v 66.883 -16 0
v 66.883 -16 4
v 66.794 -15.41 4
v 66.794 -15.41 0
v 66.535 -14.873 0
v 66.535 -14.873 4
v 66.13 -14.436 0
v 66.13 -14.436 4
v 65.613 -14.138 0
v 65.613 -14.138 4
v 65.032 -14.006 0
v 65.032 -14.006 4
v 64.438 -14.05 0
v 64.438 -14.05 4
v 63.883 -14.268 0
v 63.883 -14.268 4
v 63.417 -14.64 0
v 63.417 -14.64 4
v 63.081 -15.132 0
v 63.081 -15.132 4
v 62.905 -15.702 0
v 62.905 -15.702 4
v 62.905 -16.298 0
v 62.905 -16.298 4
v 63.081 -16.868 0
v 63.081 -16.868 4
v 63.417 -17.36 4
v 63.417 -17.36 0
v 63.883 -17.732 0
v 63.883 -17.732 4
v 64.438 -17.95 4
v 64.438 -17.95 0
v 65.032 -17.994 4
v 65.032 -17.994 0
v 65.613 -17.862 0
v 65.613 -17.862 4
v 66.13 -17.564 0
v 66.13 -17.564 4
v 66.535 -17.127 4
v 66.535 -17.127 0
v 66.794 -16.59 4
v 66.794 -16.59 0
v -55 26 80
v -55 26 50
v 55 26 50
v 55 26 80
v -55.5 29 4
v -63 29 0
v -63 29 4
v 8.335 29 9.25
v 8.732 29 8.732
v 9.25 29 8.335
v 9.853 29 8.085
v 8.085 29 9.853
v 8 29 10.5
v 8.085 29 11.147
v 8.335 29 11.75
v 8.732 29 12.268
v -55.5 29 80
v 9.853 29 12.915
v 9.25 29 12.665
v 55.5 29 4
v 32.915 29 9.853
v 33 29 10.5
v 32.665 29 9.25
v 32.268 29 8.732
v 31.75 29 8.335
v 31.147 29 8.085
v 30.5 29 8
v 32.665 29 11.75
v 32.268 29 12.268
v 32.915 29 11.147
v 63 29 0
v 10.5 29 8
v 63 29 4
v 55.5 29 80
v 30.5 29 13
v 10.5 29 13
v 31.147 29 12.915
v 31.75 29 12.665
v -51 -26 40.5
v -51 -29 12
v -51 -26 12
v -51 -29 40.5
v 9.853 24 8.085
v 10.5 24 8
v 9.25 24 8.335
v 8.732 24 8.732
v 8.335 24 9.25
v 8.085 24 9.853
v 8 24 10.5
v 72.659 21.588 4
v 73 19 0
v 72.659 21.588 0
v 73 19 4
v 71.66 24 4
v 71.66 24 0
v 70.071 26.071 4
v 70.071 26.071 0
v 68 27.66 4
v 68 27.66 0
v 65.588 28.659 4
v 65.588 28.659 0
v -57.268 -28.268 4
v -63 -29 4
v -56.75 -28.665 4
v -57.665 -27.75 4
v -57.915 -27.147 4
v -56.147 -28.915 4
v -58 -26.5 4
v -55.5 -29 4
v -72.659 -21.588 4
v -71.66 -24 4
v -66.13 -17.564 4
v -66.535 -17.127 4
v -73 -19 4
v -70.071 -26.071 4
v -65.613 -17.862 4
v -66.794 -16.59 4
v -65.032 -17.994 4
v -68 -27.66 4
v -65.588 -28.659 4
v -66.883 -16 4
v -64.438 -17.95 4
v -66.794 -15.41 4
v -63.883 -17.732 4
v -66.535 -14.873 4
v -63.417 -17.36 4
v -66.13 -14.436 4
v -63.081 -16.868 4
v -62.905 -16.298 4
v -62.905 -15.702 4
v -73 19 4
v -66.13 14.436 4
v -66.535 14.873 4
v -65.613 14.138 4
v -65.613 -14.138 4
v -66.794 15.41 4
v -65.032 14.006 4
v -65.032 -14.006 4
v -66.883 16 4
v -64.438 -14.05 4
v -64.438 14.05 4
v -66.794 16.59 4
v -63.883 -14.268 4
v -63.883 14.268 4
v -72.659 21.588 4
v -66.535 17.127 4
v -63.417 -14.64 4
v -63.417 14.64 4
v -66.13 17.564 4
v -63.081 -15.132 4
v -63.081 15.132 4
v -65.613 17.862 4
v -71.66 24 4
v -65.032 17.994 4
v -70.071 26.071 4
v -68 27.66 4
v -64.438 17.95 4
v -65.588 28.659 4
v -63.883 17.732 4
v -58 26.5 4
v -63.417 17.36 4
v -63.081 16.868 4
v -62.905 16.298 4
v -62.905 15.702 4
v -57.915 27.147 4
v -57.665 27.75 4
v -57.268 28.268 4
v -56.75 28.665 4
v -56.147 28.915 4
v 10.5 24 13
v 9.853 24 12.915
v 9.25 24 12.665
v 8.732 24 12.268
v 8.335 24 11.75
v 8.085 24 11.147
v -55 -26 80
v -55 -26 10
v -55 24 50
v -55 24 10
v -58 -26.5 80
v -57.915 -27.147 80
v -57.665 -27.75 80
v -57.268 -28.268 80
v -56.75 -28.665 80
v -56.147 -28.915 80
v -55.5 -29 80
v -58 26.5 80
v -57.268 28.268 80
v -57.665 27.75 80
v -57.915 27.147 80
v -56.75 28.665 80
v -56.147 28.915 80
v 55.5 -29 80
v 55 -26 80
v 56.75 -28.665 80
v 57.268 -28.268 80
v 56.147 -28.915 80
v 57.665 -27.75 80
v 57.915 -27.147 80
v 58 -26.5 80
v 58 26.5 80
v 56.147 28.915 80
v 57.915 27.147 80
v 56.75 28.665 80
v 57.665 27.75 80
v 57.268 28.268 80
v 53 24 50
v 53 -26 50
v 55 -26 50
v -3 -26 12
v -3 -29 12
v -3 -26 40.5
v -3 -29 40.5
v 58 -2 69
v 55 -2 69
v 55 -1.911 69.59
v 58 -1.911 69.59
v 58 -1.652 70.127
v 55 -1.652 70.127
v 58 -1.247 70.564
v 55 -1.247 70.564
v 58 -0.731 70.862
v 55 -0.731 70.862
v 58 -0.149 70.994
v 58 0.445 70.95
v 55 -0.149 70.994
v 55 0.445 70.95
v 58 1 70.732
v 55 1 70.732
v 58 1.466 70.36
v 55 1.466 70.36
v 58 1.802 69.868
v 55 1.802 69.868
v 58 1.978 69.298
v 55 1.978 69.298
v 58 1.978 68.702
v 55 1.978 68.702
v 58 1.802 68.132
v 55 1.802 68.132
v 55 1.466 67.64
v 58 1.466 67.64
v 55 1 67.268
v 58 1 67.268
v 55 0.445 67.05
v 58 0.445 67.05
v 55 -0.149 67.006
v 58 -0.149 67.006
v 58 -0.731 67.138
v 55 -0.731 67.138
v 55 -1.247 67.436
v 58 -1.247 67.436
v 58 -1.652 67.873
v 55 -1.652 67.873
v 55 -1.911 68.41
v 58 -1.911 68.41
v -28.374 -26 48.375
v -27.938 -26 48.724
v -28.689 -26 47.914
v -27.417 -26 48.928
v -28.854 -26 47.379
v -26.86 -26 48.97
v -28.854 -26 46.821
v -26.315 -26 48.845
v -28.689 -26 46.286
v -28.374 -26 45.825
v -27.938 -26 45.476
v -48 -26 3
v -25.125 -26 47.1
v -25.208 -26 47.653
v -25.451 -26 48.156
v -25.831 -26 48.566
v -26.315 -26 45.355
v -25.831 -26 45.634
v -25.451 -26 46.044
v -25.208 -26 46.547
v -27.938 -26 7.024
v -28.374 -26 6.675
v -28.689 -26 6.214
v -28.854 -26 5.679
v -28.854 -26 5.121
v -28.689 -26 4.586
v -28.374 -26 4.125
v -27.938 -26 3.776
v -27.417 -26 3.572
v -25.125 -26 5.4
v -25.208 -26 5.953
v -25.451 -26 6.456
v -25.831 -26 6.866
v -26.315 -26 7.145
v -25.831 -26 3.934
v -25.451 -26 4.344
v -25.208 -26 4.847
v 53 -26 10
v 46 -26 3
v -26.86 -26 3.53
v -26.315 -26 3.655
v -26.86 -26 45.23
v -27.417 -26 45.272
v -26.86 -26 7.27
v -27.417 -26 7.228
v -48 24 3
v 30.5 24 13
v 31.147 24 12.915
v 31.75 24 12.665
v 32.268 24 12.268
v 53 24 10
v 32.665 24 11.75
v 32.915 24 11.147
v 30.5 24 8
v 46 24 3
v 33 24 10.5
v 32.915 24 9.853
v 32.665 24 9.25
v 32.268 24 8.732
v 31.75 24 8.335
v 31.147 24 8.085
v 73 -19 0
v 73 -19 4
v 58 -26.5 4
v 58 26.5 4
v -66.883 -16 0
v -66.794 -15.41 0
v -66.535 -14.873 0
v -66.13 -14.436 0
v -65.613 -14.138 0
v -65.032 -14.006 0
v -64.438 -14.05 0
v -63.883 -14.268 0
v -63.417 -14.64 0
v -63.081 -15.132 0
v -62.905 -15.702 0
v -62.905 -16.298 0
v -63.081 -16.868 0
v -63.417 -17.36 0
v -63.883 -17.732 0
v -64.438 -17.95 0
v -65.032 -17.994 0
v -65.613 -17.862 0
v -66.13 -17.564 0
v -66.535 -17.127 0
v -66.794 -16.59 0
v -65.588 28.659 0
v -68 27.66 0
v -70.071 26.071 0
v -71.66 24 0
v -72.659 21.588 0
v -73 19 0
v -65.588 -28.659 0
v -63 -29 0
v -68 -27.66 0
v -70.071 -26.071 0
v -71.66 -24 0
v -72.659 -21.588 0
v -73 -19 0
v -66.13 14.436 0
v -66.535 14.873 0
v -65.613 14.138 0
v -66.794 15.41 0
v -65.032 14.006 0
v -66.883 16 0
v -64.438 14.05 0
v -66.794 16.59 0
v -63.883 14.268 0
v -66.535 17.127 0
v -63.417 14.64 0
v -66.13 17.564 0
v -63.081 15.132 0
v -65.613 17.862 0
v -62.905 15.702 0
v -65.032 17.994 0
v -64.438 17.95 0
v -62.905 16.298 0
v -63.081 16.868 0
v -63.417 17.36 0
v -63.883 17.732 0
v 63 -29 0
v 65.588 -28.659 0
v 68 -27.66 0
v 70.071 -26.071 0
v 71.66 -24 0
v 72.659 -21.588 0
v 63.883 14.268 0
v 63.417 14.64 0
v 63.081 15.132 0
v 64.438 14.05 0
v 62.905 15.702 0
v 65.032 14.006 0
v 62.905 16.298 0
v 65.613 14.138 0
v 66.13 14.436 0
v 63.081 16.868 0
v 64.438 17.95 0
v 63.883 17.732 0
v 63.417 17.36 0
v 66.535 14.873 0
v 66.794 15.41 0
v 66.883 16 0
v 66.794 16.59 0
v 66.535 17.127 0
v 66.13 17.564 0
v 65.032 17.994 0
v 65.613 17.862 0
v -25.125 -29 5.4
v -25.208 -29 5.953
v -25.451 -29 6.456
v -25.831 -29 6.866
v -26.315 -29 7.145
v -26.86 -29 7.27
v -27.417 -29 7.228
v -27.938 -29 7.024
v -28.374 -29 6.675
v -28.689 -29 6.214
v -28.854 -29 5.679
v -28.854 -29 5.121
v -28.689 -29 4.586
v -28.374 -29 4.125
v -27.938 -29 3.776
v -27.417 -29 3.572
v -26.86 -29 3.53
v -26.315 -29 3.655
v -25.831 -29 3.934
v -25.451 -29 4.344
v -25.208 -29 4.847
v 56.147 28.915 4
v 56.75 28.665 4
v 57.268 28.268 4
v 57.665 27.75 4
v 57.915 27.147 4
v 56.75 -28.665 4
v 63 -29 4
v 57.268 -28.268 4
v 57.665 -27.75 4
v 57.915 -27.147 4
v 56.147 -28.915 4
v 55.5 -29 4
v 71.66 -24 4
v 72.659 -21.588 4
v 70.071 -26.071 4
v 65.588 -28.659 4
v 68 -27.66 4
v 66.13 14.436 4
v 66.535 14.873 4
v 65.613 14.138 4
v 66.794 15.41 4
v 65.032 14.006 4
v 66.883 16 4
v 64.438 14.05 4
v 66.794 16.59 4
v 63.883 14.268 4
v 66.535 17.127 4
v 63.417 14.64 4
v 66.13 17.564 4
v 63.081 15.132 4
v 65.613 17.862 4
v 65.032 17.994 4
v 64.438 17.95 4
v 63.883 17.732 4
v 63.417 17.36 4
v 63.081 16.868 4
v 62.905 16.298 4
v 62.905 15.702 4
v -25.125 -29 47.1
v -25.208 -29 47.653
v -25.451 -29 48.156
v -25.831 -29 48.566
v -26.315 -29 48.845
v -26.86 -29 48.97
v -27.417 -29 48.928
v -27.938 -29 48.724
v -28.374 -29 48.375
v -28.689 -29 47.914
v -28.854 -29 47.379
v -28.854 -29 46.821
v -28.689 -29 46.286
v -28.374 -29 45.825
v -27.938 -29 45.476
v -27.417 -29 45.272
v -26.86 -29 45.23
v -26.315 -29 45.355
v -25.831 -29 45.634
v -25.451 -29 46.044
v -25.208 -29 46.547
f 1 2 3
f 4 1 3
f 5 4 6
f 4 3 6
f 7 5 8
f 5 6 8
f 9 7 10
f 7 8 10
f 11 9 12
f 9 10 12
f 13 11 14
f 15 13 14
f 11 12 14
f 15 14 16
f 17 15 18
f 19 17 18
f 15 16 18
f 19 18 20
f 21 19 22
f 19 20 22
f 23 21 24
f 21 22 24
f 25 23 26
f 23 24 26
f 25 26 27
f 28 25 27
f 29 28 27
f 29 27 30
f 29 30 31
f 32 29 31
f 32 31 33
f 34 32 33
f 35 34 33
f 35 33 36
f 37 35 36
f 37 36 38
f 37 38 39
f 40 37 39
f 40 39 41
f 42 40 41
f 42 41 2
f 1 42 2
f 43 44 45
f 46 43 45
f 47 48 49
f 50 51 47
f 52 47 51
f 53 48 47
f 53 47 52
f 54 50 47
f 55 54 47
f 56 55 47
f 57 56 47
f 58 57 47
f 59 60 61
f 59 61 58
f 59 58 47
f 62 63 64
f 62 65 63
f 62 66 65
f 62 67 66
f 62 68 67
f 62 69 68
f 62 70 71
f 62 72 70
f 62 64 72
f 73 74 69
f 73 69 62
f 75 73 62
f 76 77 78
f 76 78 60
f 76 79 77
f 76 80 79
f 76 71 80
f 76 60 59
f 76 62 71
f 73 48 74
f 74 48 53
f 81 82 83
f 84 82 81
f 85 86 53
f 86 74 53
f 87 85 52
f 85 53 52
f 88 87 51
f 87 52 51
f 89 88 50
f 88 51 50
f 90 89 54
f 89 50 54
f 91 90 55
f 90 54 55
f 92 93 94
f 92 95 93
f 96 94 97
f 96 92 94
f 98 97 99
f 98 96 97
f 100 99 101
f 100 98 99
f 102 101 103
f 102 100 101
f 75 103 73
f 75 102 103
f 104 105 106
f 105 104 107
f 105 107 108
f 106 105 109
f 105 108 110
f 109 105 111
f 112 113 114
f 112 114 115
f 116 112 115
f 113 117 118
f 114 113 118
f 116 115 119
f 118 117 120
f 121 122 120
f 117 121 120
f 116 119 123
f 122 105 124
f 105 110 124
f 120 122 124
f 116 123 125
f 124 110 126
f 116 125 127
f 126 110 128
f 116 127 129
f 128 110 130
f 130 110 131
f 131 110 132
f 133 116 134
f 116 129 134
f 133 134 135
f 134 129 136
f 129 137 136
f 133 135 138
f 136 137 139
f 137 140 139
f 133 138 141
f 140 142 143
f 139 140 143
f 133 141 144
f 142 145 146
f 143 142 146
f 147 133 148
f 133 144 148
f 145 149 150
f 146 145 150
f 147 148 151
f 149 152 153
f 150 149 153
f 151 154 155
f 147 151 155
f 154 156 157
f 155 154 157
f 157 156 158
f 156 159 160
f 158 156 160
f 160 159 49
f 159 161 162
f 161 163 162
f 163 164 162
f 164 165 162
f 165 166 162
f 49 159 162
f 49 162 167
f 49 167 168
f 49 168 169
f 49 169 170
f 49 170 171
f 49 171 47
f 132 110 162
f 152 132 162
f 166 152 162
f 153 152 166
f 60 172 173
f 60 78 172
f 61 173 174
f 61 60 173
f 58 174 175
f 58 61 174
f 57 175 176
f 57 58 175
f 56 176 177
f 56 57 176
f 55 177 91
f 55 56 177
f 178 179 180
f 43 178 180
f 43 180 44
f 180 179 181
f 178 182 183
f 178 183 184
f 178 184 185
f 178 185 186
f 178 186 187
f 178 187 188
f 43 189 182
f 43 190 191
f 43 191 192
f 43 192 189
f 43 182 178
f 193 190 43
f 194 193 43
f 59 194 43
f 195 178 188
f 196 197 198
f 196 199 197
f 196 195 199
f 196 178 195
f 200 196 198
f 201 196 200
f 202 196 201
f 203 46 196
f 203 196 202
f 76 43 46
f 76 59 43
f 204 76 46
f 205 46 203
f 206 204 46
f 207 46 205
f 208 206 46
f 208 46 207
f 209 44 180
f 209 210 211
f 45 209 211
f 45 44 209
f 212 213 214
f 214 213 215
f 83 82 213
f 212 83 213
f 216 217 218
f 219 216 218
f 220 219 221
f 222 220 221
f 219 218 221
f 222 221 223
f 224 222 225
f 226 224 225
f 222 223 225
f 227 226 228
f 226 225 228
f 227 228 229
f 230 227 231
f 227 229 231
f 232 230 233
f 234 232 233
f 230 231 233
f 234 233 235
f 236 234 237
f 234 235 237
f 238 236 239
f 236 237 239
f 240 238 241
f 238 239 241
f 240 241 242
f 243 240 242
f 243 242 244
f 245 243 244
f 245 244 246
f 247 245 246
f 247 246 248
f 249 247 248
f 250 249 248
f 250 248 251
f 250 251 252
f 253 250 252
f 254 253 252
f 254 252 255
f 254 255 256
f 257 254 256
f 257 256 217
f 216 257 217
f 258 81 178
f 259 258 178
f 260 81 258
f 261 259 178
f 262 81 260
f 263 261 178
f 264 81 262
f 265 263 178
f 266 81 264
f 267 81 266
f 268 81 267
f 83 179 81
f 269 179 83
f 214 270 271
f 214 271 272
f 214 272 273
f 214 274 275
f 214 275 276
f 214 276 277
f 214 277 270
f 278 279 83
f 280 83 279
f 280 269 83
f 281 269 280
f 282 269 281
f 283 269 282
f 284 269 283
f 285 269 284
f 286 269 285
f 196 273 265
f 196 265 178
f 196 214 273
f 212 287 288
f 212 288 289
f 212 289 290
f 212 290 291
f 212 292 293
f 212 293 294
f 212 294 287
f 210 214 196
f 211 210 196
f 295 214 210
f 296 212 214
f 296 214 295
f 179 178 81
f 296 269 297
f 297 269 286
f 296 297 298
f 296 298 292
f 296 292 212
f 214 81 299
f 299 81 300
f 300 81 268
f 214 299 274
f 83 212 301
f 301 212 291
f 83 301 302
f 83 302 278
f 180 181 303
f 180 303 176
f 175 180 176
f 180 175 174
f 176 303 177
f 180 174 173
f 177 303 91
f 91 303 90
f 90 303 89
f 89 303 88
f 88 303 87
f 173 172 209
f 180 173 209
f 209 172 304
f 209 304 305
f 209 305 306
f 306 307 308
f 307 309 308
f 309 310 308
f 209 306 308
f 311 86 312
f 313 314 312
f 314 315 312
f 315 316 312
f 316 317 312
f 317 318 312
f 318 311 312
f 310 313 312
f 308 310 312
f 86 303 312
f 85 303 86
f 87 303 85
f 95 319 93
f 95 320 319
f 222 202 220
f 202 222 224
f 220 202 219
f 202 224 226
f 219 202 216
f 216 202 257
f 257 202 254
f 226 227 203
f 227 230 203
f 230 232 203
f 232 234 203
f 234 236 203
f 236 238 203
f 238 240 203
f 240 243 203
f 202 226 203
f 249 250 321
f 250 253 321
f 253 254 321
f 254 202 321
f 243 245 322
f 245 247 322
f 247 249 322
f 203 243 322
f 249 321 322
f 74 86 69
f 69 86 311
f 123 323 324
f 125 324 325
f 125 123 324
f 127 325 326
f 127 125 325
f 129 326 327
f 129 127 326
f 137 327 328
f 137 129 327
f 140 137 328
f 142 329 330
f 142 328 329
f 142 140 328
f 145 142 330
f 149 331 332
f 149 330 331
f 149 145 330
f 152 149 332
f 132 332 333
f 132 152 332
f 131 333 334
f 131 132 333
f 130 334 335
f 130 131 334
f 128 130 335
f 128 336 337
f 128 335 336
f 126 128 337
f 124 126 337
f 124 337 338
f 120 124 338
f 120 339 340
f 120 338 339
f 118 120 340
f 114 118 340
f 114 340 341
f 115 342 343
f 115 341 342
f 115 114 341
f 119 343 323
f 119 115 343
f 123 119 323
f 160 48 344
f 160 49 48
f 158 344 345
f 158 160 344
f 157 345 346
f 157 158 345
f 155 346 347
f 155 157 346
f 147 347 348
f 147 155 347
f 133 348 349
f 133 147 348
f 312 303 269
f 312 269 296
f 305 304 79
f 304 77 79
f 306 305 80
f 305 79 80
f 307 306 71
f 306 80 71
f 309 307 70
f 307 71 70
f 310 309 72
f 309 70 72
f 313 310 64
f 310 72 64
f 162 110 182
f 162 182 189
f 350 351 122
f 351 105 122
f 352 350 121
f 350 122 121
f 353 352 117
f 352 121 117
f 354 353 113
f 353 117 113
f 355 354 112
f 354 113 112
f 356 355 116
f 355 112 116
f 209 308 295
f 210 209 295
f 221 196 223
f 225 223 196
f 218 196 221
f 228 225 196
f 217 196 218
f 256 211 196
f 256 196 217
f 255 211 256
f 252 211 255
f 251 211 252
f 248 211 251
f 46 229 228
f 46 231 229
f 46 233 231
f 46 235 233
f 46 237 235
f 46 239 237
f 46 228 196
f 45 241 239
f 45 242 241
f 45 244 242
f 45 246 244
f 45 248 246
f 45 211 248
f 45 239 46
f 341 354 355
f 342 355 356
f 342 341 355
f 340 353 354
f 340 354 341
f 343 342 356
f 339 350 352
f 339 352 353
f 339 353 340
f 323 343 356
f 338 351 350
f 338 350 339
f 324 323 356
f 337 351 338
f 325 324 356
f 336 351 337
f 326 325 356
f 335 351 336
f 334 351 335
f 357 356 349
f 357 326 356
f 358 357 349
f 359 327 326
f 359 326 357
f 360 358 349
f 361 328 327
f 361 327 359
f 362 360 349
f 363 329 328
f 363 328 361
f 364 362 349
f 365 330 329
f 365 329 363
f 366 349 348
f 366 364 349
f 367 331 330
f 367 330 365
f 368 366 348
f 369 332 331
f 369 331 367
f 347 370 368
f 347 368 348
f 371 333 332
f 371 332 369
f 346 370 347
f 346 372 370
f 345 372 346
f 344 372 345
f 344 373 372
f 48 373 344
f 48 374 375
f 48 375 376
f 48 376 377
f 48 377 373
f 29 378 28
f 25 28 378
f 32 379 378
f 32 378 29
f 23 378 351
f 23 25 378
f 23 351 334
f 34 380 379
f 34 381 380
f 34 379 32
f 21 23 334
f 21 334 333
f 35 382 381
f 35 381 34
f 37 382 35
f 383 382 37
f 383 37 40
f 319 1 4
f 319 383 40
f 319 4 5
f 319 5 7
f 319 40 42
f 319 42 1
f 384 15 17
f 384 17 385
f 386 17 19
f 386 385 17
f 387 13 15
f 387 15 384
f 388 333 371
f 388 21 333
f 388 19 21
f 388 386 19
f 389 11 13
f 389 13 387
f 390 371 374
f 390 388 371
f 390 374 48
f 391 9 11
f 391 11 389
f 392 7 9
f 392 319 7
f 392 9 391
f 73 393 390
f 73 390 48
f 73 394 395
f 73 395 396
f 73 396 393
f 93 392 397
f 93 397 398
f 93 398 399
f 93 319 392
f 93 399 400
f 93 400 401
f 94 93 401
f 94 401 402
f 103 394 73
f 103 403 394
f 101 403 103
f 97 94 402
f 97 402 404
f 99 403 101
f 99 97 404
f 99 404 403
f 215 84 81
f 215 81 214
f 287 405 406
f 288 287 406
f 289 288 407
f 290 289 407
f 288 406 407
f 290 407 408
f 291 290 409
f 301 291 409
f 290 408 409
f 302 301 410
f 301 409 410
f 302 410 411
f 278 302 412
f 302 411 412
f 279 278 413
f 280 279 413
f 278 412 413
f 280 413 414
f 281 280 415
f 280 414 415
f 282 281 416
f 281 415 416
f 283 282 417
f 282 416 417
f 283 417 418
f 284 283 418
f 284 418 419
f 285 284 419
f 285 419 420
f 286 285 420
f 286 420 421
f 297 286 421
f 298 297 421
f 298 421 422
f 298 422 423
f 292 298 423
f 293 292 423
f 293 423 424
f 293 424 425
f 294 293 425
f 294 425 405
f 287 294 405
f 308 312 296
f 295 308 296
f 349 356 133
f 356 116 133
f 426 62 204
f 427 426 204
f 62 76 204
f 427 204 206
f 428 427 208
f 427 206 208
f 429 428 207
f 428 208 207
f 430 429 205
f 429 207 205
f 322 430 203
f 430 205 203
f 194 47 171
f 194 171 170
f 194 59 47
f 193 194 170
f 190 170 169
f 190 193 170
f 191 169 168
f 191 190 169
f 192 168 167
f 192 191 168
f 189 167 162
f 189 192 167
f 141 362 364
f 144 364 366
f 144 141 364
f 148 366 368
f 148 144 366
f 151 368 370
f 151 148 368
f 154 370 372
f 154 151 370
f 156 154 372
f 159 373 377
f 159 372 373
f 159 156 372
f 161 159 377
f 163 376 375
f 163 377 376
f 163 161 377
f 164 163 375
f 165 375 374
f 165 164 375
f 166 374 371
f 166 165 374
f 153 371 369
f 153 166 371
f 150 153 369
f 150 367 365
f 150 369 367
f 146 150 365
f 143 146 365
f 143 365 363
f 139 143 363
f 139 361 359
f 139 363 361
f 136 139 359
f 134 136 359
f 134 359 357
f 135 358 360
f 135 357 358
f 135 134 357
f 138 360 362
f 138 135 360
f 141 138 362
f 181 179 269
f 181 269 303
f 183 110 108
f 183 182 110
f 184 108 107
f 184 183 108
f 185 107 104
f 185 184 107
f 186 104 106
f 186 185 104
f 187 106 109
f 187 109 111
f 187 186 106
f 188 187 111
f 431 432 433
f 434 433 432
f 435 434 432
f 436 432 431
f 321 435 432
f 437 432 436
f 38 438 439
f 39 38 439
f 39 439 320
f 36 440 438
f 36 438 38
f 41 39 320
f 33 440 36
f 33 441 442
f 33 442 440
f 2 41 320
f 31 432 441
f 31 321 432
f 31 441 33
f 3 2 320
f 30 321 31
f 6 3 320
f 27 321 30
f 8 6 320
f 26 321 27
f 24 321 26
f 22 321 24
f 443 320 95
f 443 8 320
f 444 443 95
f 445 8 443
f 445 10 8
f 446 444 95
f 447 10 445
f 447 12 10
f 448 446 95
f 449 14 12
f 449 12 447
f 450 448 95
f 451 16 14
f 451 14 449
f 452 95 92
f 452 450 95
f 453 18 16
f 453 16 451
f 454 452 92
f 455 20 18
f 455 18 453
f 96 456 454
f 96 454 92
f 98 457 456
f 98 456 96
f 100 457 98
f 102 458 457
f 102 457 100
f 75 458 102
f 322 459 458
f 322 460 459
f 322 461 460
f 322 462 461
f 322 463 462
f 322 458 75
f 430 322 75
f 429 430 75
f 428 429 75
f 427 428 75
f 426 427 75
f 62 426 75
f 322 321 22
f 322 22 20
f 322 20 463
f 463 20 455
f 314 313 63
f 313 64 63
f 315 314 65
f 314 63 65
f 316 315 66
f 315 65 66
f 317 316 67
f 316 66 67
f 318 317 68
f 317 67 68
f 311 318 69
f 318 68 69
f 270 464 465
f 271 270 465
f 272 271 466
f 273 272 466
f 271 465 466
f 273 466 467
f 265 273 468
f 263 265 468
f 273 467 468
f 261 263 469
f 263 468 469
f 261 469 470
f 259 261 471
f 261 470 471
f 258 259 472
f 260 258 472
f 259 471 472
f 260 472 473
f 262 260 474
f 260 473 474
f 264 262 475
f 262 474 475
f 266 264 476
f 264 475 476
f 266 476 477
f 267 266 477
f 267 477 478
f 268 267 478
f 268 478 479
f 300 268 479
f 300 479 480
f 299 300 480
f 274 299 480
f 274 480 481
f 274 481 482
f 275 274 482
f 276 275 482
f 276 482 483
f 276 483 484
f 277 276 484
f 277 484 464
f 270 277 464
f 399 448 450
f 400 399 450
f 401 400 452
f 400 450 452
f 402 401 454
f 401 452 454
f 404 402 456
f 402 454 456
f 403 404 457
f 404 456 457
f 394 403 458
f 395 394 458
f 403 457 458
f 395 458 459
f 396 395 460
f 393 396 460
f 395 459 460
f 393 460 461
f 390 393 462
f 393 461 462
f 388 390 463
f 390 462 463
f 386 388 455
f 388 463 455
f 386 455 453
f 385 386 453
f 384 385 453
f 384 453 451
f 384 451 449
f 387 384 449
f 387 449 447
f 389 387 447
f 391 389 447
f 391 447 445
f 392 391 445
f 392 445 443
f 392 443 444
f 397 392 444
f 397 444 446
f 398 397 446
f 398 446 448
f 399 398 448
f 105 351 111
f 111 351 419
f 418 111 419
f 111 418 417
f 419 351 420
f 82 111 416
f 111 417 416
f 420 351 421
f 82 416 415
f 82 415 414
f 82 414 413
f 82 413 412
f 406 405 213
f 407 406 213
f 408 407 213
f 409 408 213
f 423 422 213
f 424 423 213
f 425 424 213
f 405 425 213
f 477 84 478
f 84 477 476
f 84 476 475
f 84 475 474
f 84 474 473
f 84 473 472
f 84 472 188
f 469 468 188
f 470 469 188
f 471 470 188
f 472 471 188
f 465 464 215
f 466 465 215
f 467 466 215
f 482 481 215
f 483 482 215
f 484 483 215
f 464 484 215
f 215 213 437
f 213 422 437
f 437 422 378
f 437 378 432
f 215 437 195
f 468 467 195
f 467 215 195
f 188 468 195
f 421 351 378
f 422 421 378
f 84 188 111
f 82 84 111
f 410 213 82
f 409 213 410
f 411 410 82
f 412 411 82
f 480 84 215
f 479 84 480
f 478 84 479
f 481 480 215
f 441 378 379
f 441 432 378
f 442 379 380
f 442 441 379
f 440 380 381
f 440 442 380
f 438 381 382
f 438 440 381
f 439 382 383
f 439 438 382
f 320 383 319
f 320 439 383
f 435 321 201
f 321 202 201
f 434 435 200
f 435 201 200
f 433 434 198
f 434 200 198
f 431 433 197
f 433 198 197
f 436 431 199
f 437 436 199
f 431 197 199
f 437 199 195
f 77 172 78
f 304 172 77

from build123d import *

# Parameters (mm, degrees)
F0_W      = 116
F0_H      = 58
F1_DEPTH  = 80
F2_T      = -3
F4_DEPTH  = 47
F5_R      = 2
F6_DEPTH  = 3.001
F7_W      = 58
F7_H      = 4
F8_DEPTH  = 15
F9_R      = 10
F10_R     = 2
F11_DEPTH = 4.001
F12_W     = 48
F12_H     = 28.5
F13_DEPTH = 5
F14_R     = 1.875
F15_DEPTH = 5
F16_W     = 25
F16_H     = 5
F17_DEPTH = 5.001
F18_R     = 2.49999
F19_R     = 2.5
F20_SIZE  = 7


# Not quite as in the source:
# - a fillet or chamfer is up to 0.001 mm smaller than in the source, because OpenCascade refuses the exact size
# - a pattern or mirror of a feature is missing from the dataset's text; its kind, count and spacing are read off the source's solid


with BuildPart() as f1:
    # F0 (on Top) → F1 (new body)
    with BuildSketch(Plane.XY):
        Rectangle(F0_W, F0_H)
    extrude(amount=F1_DEPTH)

    # F2
    f2_openings = [f1.faces().sort_by_distance(p)[0] for p in [
        (0, 0, 80),
    ]]
    offset(amount=F2_T, openings=f2_openings)

    # F3 (on face) → F4 (join)
    with BuildSketch(Plane.XY.offset(3)):
        Polygon((-55, 26), (-55, 24), (53, 24), (53, -26), (55, -26), (55, 26), align=None)
    extrude(amount=F4_DEPTH)

    # F5 (on face) → F6 (cut, through all)
    with BuildSketch(Plane(origin=(55, 0, 0), x_dir=(0, -1, 0), z_dir=(-1, 0, 0))):
        with Locations((0, 69)):
            Circle(F5_R)
    extrude(amount=-F6_DEPTH, mode=Mode.SUBTRACT)

    # F7 (on face) → F8 (join)
    with BuildSketch(Plane.YZ.offset(58)):
        with Locations((0, 2)):
            Rectangle(F7_W, F7_H)
    f8 = extrude(amount=F8_DEPTH)

    # F8_copies: F8 across plane
    add(f8.mirror(Plane(origin=(0, 0, 0), x_dir=(0, 0, -1), z_dir=(-1, 0, 0))))

    # F9
    f9_edges = [f1.edges().sort_by_distance(p)[0] for p in [
        (73, 29, 2),
        (73, -29, 2),
        (-73, -29, 2),
        (-73, 29, 2),
    ]]
    fillet(f9_edges, radius=F9_R)

    # F10 (on face) → F11 (cut, through all)
    with BuildSketch(Plane.XY.offset(4)):
        with Locations((64.8827031255, 16)):
            Circle(F10_R)
        with Locations((64.8827031255, -16)):
            Circle(F10_R)
    f11 = extrude(amount=-F11_DEPTH, mode=Mode.SUBTRACT)

    # F11_copies: F11 across plane
    add(f11.mirror(Plane(origin=(0, 0, 0), x_dir=(0, 0, -1), z_dir=(-1, 0, 0))), mode=Mode.SUBTRACT)

    # F12 (on face) → F13 (cut)
    with BuildSketch(Plane.XZ.offset(29)):
        with Locations((-27, 26.25)):
            Rectangle(F12_W, F12_H)
    extrude(amount=-F13_DEPTH, mode=Mode.SUBTRACT)

    # F14 (on face) → F15 (cut)
    with BuildSketch(Plane.XZ.offset(29)):
        with Locations((-27, 47.1)):
            Circle(F14_R)
        with Locations((-27, 5.4)):
            Circle(F14_R)
    extrude(amount=-F15_DEPTH, mode=Mode.SUBTRACT)

    # F16 (on face) → F17 (cut, through all)
    with BuildSketch(Plane.XZ.offset(-24)):
        with Locations((20.5, 10.5)):
            Rectangle(F16_W, F16_H)
    extrude(amount=-F17_DEPTH, mode=Mode.SUBTRACT)

    # F18 (radius 2.5 in the source; OpenCascade refuses exactly that, so slightly less here)
    f18_edges = [f1.edges().sort_by_distance(p)[0] for p in [
        (33, 26.5, 13),
        (8, 26.5, 13),
        (33, 26.5, 8),
        (8, 26.5, 8),
    ]]
    fillet(f18_edges, radius=F18_R)

    # F19
    f19_edges = [f1.edges().sort_by_distance(p)[0] for p in [
        (-58, -29, 42),
        (58, -29, 42),
        (58, 29, 42),
        (-58, 29, 42),
    ]]
    fillet(f19_edges, radius=F19_R)

    # F20
    f20_edges = [f1.edges().sort_by_distance(p)[0] for p in [
        (-55, -1, 3),
        (53, -1, 3),
    ]]
    chamfer(f20_edges, length=F20_SIZE)


solid = f1.part
